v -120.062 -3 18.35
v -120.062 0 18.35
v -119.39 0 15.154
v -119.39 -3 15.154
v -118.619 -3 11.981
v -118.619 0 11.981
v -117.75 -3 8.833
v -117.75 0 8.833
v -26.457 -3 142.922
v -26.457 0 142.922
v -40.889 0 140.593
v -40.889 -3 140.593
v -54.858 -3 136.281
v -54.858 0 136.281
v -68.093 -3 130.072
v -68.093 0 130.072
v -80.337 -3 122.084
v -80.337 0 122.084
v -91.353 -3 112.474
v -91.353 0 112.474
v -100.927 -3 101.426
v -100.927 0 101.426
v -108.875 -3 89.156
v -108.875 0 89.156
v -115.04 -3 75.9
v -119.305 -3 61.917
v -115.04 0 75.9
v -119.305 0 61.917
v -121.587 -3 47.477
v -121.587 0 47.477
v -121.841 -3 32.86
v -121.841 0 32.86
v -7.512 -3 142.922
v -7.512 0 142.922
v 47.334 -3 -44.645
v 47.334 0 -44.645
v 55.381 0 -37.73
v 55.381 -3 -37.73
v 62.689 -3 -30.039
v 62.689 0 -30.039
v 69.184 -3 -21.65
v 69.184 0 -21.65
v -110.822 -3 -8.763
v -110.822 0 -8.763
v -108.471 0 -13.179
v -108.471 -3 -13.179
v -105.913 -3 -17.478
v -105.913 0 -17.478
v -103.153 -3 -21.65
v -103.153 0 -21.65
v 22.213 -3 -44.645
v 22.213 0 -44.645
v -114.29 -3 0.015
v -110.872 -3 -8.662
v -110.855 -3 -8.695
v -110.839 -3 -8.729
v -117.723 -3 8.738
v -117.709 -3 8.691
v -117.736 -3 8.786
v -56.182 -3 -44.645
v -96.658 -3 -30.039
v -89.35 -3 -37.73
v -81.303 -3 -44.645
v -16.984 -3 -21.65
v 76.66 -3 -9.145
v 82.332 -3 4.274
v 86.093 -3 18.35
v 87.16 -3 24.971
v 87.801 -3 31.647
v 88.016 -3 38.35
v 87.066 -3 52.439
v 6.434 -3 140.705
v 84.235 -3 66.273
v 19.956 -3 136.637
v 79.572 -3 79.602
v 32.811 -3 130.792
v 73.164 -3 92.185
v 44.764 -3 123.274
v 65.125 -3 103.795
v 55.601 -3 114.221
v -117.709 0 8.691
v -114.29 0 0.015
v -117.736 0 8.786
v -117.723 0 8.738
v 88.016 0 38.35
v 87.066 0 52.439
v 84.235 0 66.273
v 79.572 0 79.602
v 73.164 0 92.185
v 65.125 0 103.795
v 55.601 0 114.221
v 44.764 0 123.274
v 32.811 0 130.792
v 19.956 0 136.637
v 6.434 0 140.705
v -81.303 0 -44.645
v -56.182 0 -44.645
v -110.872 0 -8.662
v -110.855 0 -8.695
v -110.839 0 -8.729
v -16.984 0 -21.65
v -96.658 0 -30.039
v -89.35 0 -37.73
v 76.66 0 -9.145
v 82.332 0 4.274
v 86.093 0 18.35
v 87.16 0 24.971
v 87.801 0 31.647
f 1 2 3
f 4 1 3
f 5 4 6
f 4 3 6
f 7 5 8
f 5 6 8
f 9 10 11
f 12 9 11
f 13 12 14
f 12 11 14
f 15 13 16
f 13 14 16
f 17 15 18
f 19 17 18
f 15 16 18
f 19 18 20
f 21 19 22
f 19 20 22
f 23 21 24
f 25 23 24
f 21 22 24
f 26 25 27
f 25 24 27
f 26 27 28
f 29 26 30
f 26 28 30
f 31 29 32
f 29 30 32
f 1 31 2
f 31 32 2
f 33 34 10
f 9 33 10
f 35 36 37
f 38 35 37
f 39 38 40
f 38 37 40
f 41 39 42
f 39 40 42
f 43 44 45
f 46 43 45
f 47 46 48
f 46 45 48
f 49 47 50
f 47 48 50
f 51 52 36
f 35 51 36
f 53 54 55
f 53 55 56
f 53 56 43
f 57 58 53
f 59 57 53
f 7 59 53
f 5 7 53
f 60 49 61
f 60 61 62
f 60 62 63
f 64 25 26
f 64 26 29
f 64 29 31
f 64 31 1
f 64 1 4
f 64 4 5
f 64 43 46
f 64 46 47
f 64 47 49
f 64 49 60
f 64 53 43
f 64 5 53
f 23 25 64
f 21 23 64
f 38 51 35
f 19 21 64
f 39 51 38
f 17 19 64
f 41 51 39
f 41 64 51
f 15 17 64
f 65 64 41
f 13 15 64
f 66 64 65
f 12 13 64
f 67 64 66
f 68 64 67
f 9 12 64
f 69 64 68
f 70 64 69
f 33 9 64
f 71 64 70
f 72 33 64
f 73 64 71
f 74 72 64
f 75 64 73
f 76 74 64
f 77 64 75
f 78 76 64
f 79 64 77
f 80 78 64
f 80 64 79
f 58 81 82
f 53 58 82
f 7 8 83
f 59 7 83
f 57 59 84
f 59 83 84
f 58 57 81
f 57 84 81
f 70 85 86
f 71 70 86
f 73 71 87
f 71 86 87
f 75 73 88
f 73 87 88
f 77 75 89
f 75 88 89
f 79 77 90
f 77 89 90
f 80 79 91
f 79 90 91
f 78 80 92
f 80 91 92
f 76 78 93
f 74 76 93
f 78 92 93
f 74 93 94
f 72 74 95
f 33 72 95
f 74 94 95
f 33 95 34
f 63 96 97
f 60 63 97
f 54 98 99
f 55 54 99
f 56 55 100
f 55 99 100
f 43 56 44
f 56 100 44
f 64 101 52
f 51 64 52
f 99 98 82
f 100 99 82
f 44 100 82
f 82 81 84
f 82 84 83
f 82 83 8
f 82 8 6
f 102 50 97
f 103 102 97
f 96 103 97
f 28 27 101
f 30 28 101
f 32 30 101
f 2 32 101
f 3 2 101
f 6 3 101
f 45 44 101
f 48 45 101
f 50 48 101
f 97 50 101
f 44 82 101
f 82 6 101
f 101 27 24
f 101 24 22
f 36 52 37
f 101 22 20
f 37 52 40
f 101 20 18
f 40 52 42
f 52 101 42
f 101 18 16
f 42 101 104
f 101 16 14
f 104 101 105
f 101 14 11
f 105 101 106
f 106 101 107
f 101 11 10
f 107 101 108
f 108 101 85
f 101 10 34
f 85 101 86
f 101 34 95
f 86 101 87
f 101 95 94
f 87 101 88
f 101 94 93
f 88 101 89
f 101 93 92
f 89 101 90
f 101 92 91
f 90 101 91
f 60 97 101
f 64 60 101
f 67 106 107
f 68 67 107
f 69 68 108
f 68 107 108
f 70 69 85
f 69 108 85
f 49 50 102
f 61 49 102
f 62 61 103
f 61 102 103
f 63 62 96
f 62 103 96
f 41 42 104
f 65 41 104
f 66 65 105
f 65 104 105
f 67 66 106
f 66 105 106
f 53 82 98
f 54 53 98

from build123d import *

# Parameters (mm, degrees)
F0_W     = 40
F0_H     = 40
F0_W_2   = 9.4724982
F0_H_2   = 96
F0_W_3   = 9.4725108908
F1_DEPTH = 3


# Not quite as in the source:
# - ends of sketch curves that miss each other by under 0.0002 mm in the source are joined


with BuildPart() as f1:
    # F0 (on Front) → F1 (new body)
    with BuildSketch(Plane.XZ):
        with BuildLine():
            ThreePointArc((86.0931563339, 18.3499035886), (87.5338209496, 28.3038164709), (88.0155156934, 38.3499035886))
            ThreePointArc((88.0155156934, 38.3499035886), (60.5384552721, 109.1679368787), (-7.5119860033, 142.9217534139))
            Line((-7.5119860033, 142.9217534139), (-7.5119861066, 46.9217522737))
            Line((-7.5119861066, 46.9217522737), (-16.9844843066, 46.9217522737))
            Line((-16.9844843066, 46.9217522737), (-16.9844843066, 38.3499035886))
            Line((-16.9844843066, 38.3499035886), (-16.9844843066, 18.3499035886))
            Line((-16.9844843066, 18.3499035886), (7.9387861441, 18.3499035886))
            Line((7.9387861441, 18.3499035886), (-12.4932068051, 26.3993963716))
            Line((-12.4932068051, 26.3993963716), (-8.6108822672, 35.0509963625))
            Line((-8.6108822672, 35.0509963625), (-5.9856059721, 42.9176116083))
            Line((-5.9856059721, 42.9176116083), (56.3745017477, 18.3499035886))
            Line((56.3745017477, 18.3499035886), (86.0931563339, 18.3499035886))
        make_face()
        with Locations((38.3114193761, 61.7765981326)):
            Rectangle(F0_W, F0_H, mode=Mode.SUBTRACT)
        with Locations((-12.2482352066, 94.9217522737)):
            Rectangle(F0_W_2, F0_H_2)
        with BuildLine():
            ThreePointArc((69.1839553915, -21.6500964114), (79.7291121051, -2.533837301), (86.0931563339, 18.3499035886))
            Line((86.0931563339, 18.3499035886), (56.3745017477, 18.3499035886))
            Line((56.3745017477, 18.3499035886), (83.3328157811, 7.7292678634))
            Line((83.3328157811, 7.7292678634), (80.2973141438, 0.0242670983))
            Line((80.2973141438, 0.0242670983), (76.8252149481, -8.7889473734))
            Line((76.8252149481, -8.7889473734), (7.9387861441, 18.3499035886))
            Line((7.9387861441, 18.3499035886), (-16.9844843066, 18.3499035886))
            Line((-16.9844843066, 18.3499035886), (69.1839553915, -21.6500964114))
        make_face()
        with Locations((-21.720739752, 94.9217522737)):
            Rectangle(F0_W_3, F0_H_2)
        with BuildLine():
            ThreePointArc((47.3344412398, -44.6445288546), (59.1325161296, -33.9771469845), (69.1839553915, -21.6500964114))
            Line((69.1839553915, -21.6500964114), (-16.9844843066, 18.3499035886))
            Line((-16.9844843066, 18.3499035886), (-103.1529240046, -21.6500964114))
            ThreePointArc((-103.1529240046, -21.6500964114), (-93.1014847427, -33.9771469845), (-81.3034098529, -44.6445288546))
            Line((-81.3034098529, -44.6445288546), (-56.1818756669, -44.6445288546))
            Line((-56.1818756669, -44.6445288546), (-16.9844843066, -21.6500964114))
            Line((-16.9844843066, -21.6500964114), (22.2130476509, -44.6445288546))
            Line((22.2130476509, -44.6445288546), (47.3344412398, -44.6445288546))
        make_face()
        Polygon((83.3328157811, 7.7292678634), (56.3745017477, 18.3499035886), (7.9387861441, 18.3499035886), (76.8252149481, -8.7889473734), (80.2973141438, 0.0242670983), align=None)
        Polygon((7.9387861441, 18.3499035886), (56.3745017477, 18.3499035886), (-5.9856059721, 42.9176116083), (-8.6108822672, 35.0509963625), (-12.4932068051, 26.3993963716), align=None)
        with BuildLine():
            Line((-26.4569951974, 46.9217522737), (-26.4569951974, 142.9217522737))
            ThreePointArc((-26.4569951974, 142.9217522737), (-100.9274442474, 101.4258853595), (-120.062124947, 18.3499035886))
            Line((-120.062124947, 18.3499035886), (-93.5930420098, 18.3499035886))
            Line((-93.5930420098, 18.3499035886), (-28.4441302912, 44.0163031416))
            Line((-28.4441302912, 44.0163031416), (-25.3580863459, 35.0509963625))
            Line((-25.3580863459, 35.0509963625), (-21.5126400611, 26.4221312691))
            Line((-21.5126400611, 26.4221312691), (-42.002340903, 18.3499035886))
            Line((-42.002340903, 18.3499035886), (-16.9844843066, 18.3499035886))
            Line((-16.9844843066, 18.3499035886), (-16.9844843066, 38.3499035886))
            Line((-16.9844843066, 38.3499035886), (-16.9844843066, 46.9217522737))
            Line((-16.9844843066, 46.9217522737), (-26.4569951974, 46.9217522737))
        make_face()
        with Locations((-72.2803842399, 61.7765981326)):
            Rectangle(F0_W, F0_H, mode=Mode.SUBTRACT)
        with BuildLine():
            Line((-103.1529240046, -21.6500964114), (-16.9844843066, 18.3499035886))
            Line((-16.9844843066, 18.3499035886), (-42.002340903, 18.3499035886))
            Line((-42.002340903, 18.3499035886), (-110.8216826256, -8.7625174025))
            ThreePointArc((-110.8216826256, -8.7625174025), (-107.2176813721, -15.3433934543), (-103.1529240046, -21.6500964114))
        make_face()
        with BuildLine():
            Line((-93.5930420098, 18.3499035886), (-120.062124947, 18.3499035886))
            ThreePointArc((-120.062124947, 18.3499035886), (-119.0172144252, 13.5643839342), (-117.750256284, 8.8328034975))
            Line((-117.750256284, 8.8328034975), (-93.5930420098, 18.3499035886))
        make_face()
        with BuildLine():
            Line((-110.8216826256, -8.7625174025), (-42.002340903, 18.3499035886))
            Line((-42.002340903, 18.3499035886), (-93.5930420098, 18.3499035886))
            Line((-93.5930420098, 18.3499035886), (-117.750256284, 8.8328034975))
            ThreePointArc((-117.750256284, 8.8328034975), (-117.7294799239, 8.7619692561), (-117.7086537702, 8.6911496387))
            Line((-117.7086537702, 8.6911496387), (-114.2904528488, 0.0147449249))
            Line((-114.2904528488, 0.0147449249), (-110.8722519274, -8.6616597888))
            ThreePointArc((-110.8722519274, -8.6616597888), (-110.8469808232, -8.7120953879), (-110.8216826256, -8.7625174025))
        make_face()
        Polygon((-93.5930420098, 18.3499035886), (-42.002340903, 18.3499035886), (-21.5126400611, 26.4221312691), (-25.3580863459, 35.0509963625), (-28.4441302912, 44.0163031416), align=None)
        with Locations((38.3114193761, 61.7765981326)):
            Rectangle(F0_W, F0_H)
        with Locations((-72.2803842399, 61.7765981326)):
            Rectangle(F0_W, F0_H)
    extrude(amount=F1_DEPTH)


solid = f1.part
